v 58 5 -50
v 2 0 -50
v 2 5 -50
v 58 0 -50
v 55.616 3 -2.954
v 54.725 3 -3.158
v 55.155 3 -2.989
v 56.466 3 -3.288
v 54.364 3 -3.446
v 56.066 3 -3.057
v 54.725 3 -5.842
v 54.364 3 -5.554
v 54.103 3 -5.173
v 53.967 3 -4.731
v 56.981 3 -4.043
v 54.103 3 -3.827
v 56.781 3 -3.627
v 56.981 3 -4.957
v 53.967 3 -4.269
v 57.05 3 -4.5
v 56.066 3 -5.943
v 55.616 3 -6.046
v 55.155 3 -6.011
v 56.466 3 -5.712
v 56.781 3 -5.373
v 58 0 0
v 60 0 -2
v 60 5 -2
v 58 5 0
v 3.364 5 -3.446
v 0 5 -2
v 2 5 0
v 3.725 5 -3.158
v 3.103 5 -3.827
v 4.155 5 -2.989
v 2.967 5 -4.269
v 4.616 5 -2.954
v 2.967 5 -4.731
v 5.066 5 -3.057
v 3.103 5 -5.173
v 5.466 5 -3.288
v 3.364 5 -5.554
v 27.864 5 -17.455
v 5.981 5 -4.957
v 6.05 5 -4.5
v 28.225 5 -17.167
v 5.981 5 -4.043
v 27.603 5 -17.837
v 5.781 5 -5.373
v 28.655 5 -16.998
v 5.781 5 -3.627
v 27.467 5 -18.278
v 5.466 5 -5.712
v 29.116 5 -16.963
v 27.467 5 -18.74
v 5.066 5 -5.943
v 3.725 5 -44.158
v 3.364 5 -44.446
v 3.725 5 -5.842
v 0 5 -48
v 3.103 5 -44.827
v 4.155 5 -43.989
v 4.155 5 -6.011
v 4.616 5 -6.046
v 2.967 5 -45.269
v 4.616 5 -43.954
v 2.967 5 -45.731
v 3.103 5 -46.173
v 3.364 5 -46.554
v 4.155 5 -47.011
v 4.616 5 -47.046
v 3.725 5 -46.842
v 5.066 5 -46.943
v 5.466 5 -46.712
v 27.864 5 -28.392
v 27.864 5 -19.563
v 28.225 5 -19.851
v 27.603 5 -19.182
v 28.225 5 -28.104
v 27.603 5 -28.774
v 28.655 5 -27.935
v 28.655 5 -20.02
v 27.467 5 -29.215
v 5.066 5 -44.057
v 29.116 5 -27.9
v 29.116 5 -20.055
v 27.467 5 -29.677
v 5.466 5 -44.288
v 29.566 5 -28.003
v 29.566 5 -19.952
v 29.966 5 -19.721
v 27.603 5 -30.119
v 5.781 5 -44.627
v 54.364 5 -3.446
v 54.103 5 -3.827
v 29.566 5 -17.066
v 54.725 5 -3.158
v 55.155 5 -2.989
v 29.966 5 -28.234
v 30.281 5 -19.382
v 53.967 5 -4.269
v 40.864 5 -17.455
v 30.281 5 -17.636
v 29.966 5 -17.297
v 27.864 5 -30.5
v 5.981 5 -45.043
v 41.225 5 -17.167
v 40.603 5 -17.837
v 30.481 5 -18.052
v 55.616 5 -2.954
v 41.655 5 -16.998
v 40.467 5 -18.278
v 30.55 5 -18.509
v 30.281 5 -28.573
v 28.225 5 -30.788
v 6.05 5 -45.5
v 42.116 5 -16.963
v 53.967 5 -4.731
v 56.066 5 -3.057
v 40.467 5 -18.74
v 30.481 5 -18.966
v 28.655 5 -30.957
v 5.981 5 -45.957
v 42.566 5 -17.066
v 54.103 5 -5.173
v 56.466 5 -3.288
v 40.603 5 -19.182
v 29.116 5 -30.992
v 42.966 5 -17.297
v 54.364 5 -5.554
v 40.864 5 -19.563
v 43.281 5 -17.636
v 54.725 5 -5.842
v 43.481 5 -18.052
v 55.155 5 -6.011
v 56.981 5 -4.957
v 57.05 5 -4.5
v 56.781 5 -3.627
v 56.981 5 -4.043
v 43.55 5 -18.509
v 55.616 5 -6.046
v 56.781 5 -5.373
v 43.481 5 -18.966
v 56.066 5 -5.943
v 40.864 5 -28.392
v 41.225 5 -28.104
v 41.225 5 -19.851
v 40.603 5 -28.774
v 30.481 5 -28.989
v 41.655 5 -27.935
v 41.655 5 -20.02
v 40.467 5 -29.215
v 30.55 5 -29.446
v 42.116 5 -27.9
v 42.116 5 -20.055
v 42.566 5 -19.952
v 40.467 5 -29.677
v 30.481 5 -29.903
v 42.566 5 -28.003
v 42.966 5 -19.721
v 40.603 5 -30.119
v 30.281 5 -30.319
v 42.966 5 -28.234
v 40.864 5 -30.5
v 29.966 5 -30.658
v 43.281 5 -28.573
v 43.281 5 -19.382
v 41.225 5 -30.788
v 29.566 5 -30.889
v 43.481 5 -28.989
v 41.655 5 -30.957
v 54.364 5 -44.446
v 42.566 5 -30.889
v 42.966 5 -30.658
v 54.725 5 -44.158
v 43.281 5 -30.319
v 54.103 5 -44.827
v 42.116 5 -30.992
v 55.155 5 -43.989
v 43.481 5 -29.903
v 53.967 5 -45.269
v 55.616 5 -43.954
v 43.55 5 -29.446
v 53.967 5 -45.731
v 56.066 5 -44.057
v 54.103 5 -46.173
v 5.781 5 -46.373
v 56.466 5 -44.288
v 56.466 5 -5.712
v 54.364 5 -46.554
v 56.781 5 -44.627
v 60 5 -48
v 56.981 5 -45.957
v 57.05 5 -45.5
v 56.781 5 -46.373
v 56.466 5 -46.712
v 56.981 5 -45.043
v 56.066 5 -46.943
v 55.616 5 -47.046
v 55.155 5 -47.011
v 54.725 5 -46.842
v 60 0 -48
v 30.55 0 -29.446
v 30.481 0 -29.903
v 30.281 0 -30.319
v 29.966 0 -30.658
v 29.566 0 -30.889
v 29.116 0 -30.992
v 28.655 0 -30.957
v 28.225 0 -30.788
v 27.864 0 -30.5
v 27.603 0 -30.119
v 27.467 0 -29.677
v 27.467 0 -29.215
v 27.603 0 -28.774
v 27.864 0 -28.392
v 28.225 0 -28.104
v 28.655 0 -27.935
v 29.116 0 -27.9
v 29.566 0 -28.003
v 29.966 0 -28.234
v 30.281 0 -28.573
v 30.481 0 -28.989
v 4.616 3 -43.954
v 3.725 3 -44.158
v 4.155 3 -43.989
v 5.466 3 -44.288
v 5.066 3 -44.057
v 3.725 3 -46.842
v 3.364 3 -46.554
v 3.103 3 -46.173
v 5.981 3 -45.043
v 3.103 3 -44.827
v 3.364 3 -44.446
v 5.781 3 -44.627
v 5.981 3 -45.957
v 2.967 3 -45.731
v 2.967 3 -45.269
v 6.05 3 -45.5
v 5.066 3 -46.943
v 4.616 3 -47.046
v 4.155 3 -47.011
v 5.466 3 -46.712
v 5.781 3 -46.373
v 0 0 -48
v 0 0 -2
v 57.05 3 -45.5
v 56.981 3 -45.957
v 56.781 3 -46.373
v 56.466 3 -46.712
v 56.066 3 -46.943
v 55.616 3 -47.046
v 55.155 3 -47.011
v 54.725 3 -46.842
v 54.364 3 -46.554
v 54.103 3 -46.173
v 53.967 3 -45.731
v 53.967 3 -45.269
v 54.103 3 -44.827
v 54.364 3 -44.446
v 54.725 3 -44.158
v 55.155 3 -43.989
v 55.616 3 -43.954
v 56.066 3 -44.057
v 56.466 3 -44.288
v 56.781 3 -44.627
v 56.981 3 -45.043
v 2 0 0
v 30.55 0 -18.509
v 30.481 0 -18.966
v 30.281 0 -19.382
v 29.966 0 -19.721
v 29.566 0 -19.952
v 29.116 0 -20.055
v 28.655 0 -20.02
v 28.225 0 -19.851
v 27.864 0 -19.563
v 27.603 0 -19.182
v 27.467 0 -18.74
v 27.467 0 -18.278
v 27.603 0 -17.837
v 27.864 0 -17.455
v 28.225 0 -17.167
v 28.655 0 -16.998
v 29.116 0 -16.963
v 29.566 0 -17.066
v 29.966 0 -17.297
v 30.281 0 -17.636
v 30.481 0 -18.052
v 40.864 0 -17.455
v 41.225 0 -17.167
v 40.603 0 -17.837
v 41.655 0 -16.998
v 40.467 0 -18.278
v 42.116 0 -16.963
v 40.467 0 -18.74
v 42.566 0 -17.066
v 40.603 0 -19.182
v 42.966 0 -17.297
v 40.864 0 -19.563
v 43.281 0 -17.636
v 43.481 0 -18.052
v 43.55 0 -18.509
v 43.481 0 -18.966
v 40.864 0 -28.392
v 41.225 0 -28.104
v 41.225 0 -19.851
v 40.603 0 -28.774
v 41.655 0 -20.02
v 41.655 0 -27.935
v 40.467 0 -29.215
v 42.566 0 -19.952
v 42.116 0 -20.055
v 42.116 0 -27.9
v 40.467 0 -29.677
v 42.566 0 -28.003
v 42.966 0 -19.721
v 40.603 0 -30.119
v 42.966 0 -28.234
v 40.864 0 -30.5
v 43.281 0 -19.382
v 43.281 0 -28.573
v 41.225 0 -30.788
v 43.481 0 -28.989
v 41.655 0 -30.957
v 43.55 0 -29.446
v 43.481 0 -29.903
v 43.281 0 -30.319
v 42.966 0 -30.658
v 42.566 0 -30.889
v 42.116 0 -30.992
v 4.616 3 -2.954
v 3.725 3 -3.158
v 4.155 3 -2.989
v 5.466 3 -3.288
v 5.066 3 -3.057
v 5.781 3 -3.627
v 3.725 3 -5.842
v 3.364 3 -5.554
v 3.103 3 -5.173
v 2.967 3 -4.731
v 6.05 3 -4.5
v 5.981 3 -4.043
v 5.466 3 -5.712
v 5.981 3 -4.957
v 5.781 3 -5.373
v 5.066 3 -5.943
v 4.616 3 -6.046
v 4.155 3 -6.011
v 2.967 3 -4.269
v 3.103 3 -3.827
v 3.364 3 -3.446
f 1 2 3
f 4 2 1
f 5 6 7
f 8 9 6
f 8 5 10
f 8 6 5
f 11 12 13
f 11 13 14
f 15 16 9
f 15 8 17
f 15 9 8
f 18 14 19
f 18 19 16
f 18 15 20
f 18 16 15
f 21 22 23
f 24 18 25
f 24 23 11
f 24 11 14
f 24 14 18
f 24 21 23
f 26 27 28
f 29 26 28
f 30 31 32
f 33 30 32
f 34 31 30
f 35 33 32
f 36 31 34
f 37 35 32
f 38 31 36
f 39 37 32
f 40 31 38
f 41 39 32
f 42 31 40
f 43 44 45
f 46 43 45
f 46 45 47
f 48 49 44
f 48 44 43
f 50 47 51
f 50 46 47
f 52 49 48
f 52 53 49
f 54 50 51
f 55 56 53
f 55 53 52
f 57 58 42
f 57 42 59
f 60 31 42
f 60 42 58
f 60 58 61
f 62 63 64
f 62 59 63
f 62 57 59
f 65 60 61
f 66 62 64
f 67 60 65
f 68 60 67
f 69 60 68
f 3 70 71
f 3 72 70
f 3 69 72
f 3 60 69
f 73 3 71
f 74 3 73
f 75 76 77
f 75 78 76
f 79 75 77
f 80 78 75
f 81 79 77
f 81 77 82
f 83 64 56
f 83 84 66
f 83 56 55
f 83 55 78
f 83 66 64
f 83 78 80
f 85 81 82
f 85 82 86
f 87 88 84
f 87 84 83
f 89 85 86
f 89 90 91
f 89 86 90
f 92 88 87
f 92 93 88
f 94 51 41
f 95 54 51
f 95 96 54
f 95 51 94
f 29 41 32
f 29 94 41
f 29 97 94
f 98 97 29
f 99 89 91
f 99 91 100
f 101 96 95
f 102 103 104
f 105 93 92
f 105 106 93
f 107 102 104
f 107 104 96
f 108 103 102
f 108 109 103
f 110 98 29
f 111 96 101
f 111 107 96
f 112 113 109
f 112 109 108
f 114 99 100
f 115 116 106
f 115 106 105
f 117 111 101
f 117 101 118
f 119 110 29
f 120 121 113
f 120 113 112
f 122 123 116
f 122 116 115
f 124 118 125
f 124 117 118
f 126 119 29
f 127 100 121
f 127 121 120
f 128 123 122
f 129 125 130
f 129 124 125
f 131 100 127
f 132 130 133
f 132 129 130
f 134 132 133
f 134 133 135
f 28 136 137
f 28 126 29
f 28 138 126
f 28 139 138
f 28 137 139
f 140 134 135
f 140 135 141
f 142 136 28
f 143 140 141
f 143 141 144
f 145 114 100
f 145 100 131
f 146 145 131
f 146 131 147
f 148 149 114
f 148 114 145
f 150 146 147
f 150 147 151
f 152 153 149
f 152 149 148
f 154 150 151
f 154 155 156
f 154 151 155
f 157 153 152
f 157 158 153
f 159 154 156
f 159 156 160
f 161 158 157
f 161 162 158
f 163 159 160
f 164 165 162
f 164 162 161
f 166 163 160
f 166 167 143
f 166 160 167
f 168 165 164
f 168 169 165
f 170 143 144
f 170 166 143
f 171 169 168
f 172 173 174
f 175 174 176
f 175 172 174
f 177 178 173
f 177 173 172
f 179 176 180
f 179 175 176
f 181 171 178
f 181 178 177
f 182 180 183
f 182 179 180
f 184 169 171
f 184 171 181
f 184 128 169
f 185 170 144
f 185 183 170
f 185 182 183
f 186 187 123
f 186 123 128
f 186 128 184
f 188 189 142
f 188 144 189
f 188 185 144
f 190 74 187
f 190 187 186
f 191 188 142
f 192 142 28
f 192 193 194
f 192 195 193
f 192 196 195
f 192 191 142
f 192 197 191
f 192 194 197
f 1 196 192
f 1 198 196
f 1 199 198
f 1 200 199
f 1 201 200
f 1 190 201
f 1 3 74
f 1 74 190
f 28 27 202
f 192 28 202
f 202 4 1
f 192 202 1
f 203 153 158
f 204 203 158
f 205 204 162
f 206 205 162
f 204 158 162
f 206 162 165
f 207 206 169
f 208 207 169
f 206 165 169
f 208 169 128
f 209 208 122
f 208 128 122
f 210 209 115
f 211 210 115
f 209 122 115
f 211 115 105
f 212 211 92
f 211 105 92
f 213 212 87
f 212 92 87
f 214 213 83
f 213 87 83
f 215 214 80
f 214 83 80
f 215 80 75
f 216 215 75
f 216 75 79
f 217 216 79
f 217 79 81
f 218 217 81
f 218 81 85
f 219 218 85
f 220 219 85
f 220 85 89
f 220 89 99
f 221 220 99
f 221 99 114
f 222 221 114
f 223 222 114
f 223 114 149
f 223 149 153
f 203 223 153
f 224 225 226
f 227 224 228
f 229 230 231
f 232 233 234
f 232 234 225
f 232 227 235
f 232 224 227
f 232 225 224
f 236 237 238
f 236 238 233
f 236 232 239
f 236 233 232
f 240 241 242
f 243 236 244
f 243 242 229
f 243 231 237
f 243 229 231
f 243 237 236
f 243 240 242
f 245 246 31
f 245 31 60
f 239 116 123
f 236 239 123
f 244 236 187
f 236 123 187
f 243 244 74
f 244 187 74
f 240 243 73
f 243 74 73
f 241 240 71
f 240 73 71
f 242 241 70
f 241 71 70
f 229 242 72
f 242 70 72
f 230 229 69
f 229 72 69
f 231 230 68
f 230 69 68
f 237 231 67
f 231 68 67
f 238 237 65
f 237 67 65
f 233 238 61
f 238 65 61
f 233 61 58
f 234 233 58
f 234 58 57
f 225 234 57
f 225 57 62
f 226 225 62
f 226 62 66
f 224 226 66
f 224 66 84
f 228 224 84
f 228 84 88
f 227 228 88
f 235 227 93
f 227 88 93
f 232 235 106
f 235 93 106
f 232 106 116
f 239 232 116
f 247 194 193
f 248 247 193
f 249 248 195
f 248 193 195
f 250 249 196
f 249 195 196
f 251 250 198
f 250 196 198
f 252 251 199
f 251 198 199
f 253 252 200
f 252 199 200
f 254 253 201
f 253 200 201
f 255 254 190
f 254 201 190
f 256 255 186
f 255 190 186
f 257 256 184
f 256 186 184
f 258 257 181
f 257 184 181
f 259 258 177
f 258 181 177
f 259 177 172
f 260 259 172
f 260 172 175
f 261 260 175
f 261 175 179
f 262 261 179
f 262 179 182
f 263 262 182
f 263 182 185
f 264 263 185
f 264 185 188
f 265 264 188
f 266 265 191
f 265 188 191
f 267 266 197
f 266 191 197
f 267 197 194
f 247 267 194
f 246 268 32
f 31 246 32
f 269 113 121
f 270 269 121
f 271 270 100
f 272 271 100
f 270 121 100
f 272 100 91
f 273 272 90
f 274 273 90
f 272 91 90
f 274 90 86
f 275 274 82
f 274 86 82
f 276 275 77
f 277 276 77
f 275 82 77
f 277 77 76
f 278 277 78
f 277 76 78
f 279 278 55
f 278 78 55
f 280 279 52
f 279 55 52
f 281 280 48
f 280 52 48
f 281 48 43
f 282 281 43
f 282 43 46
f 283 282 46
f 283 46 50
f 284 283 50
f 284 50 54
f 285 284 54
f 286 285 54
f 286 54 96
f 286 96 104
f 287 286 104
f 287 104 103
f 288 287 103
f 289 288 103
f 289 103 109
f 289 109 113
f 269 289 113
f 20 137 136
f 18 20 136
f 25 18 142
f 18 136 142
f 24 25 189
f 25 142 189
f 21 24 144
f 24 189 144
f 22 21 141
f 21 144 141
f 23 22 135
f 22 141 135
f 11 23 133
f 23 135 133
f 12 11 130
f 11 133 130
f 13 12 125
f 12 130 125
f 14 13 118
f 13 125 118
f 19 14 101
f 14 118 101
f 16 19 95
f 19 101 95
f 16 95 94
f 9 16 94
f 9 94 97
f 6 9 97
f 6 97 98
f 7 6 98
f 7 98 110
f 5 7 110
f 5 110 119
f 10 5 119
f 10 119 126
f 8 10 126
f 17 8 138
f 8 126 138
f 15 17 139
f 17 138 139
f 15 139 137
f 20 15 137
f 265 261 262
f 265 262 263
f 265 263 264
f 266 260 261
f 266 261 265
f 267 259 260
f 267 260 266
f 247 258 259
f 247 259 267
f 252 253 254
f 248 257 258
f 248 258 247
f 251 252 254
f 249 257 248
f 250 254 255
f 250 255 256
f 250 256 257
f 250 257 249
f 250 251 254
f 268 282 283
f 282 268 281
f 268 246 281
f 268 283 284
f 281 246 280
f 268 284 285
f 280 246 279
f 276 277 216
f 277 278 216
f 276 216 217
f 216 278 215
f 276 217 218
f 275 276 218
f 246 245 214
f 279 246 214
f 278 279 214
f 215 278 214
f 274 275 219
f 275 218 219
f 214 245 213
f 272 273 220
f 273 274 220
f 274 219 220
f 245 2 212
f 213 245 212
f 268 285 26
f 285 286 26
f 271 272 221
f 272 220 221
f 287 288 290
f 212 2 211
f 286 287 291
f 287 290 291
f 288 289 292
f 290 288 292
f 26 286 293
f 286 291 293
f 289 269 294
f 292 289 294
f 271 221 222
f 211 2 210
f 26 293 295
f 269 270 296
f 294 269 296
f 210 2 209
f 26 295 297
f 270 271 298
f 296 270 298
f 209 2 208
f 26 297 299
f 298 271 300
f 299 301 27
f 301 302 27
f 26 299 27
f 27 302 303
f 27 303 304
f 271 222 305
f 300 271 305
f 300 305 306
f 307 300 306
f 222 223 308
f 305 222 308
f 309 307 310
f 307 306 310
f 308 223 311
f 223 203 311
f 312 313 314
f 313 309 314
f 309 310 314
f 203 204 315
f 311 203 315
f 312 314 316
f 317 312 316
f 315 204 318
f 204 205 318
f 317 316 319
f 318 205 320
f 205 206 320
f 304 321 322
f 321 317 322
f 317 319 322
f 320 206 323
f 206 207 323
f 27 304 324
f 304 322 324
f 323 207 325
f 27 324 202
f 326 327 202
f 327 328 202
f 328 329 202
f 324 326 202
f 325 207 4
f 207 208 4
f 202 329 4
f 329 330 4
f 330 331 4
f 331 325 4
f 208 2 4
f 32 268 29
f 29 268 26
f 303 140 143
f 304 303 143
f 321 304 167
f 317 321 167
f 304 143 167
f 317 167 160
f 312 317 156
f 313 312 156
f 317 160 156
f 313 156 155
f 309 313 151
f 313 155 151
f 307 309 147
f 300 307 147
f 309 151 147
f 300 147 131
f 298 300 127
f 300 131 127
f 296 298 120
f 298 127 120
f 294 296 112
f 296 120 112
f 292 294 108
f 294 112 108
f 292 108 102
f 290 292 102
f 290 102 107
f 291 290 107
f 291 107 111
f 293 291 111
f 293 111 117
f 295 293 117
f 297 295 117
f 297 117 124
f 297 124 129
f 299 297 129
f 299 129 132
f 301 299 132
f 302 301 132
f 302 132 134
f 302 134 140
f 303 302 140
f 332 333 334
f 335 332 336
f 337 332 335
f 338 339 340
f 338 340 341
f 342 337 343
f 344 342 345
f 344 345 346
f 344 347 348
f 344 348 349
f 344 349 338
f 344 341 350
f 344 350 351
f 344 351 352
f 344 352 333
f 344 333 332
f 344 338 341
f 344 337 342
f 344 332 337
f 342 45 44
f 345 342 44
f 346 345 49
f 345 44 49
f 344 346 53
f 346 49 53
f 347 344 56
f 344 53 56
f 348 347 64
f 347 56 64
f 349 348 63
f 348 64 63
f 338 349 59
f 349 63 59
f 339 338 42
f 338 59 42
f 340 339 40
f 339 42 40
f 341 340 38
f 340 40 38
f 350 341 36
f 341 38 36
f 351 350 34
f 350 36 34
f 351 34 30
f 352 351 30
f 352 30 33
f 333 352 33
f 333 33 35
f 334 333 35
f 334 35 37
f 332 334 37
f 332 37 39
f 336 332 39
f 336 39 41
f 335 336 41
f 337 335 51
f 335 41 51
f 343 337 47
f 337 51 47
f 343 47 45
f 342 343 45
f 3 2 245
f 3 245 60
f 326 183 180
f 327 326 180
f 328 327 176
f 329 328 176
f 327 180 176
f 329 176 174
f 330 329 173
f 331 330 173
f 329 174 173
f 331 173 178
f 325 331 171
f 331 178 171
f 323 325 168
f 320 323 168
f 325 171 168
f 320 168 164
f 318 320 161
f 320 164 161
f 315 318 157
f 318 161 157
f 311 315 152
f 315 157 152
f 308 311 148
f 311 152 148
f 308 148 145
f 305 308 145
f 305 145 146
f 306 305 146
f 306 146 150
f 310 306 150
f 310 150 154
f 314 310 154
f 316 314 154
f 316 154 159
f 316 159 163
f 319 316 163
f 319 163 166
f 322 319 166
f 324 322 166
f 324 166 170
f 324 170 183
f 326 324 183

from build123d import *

# Parameters (mm, degrees)
SKETCH1_W           = 60
SKETCH1_H           = 50
BOSS_EXTRUDE1_DEPTH = 5
CHAMFER1_SIZE       = 2
SKETCH2_R           = 1.55
CUT_EXTRUDE1_DEPTH  = 2
CUT_EXTRUDE2_REACH  = 7
SKETCH3_R           = 1.55


with BuildPart() as part:
    # Sketch1 → Boss-Extrude1 (new body)
    with BuildSketch(Plane(origin=(0, 0, 0), x_dir=(1, 0, 0), z_dir=(0, 1, 0))):
        with Locations((30, 25)):
            Rectangle(SKETCH1_W, SKETCH1_H)
    extrude(amount=BOSS_EXTRUDE1_DEPTH)

    # Chamfer1
    chamfer1_edges = [part.edges().sort_by_distance(p)[0] for p in [
        (0, 2.5, -50),
        (60, 2.5, -50),
        (60, 2.5, 0),
        (0, 2.5, 0),
    ]]
    chamfer(chamfer1_edges, length=CHAMFER1_SIZE)

    # Sketch2 → Cut-Extrude1 (cut)
    with BuildSketch(Plane(origin=(0, 5, 0), x_dir=(1, 0, 0), z_dir=(0, 1, 0))):
        with Locations((55.5, 4.5)):
            Circle(SKETCH2_R)
        with Locations((4.5, 4.5)):
            Circle(SKETCH2_R)
        with Locations((4.5, 45.5)):
            Circle(SKETCH2_R)
        with Locations((55.5, 45.5)):
            Circle(SKETCH2_R)
    extrude(amount=-CUT_EXTRUDE1_DEPTH, mode=Mode.SUBTRACT)

    # Sketch3 → Cut-Extrude2 (cut, up to next)
    with BuildSketch(Plane(origin=(0, 5, 0), x_dir=(1, 0, 0), z_dir=(0, 1, 0)), mode=Mode.PRIVATE) as cut_extrude2_sk1:
        with Locations((42, 29.446052378)):
            Circle(SKETCH3_R)
    cut_extrude2_tool1 = extrude(cut_extrude2_sk1.sketch, amount=-CUT_EXTRUDE2_REACH, mode=Mode.PRIVATE) & part.part
    add(cut_extrude2_tool1.solids().sort_by_distance((42, 5, -29.446052))[0], mode=Mode.SUBTRACT)
    # Sketch3 → Cut-Extrude2 (cut, up to next)
    with BuildSketch(Plane(origin=(0, 5, 0), x_dir=(1, 0, 0), z_dir=(0, 1, 0)), mode=Mode.PRIVATE) as cut_extrude2_sk2:
        with Locations((29, 29.446052378)):
            Circle(SKETCH3_R)
    cut_extrude2_tool2 = extrude(cut_extrude2_sk2.sketch, amount=-CUT_EXTRUDE2_REACH, mode=Mode.PRIVATE) & part.part
    add(cut_extrude2_tool2.solids().sort_by_distance((29, 5, -29.446052))[0], mode=Mode.SUBTRACT)
    # Sketch3 → Cut-Extrude2 (cut, up to next)
    with BuildSketch(Plane(origin=(0, 5, 0), x_dir=(1, 0, 0), z_dir=(0, 1, 0)), mode=Mode.PRIVATE) as cut_extrude2_sk3:
        with Locations((42, 18.509029021)):
            Circle(SKETCH3_R)
    cut_extrude2_tool3 = extrude(cut_extrude2_sk3.sketch, amount=-CUT_EXTRUDE2_REACH, mode=Mode.PRIVATE) & part.part
    add(cut_extrude2_tool3.solids().sort_by_distance((42, 5, -18.509029))[0], mode=Mode.SUBTRACT)
    # Sketch3 → Cut-Extrude2 (cut, up to next)
    with BuildSketch(Plane(origin=(0, 5, 0), x_dir=(1, 0, 0), z_dir=(0, 1, 0)), mode=Mode.PRIVATE) as cut_extrude2_sk4:
        with Locations((29, 18.509029021)):
            Circle(SKETCH3_R)
    cut_extrude2_tool4 = extrude(cut_extrude2_sk4.sketch, amount=-CUT_EXTRUDE2_REACH, mode=Mode.PRIVATE) & part.part
    add(cut_extrude2_tool4.solids().sort_by_distance((29, 5, -18.509029))[0], mode=Mode.SUBTRACT)


solid = part.part
